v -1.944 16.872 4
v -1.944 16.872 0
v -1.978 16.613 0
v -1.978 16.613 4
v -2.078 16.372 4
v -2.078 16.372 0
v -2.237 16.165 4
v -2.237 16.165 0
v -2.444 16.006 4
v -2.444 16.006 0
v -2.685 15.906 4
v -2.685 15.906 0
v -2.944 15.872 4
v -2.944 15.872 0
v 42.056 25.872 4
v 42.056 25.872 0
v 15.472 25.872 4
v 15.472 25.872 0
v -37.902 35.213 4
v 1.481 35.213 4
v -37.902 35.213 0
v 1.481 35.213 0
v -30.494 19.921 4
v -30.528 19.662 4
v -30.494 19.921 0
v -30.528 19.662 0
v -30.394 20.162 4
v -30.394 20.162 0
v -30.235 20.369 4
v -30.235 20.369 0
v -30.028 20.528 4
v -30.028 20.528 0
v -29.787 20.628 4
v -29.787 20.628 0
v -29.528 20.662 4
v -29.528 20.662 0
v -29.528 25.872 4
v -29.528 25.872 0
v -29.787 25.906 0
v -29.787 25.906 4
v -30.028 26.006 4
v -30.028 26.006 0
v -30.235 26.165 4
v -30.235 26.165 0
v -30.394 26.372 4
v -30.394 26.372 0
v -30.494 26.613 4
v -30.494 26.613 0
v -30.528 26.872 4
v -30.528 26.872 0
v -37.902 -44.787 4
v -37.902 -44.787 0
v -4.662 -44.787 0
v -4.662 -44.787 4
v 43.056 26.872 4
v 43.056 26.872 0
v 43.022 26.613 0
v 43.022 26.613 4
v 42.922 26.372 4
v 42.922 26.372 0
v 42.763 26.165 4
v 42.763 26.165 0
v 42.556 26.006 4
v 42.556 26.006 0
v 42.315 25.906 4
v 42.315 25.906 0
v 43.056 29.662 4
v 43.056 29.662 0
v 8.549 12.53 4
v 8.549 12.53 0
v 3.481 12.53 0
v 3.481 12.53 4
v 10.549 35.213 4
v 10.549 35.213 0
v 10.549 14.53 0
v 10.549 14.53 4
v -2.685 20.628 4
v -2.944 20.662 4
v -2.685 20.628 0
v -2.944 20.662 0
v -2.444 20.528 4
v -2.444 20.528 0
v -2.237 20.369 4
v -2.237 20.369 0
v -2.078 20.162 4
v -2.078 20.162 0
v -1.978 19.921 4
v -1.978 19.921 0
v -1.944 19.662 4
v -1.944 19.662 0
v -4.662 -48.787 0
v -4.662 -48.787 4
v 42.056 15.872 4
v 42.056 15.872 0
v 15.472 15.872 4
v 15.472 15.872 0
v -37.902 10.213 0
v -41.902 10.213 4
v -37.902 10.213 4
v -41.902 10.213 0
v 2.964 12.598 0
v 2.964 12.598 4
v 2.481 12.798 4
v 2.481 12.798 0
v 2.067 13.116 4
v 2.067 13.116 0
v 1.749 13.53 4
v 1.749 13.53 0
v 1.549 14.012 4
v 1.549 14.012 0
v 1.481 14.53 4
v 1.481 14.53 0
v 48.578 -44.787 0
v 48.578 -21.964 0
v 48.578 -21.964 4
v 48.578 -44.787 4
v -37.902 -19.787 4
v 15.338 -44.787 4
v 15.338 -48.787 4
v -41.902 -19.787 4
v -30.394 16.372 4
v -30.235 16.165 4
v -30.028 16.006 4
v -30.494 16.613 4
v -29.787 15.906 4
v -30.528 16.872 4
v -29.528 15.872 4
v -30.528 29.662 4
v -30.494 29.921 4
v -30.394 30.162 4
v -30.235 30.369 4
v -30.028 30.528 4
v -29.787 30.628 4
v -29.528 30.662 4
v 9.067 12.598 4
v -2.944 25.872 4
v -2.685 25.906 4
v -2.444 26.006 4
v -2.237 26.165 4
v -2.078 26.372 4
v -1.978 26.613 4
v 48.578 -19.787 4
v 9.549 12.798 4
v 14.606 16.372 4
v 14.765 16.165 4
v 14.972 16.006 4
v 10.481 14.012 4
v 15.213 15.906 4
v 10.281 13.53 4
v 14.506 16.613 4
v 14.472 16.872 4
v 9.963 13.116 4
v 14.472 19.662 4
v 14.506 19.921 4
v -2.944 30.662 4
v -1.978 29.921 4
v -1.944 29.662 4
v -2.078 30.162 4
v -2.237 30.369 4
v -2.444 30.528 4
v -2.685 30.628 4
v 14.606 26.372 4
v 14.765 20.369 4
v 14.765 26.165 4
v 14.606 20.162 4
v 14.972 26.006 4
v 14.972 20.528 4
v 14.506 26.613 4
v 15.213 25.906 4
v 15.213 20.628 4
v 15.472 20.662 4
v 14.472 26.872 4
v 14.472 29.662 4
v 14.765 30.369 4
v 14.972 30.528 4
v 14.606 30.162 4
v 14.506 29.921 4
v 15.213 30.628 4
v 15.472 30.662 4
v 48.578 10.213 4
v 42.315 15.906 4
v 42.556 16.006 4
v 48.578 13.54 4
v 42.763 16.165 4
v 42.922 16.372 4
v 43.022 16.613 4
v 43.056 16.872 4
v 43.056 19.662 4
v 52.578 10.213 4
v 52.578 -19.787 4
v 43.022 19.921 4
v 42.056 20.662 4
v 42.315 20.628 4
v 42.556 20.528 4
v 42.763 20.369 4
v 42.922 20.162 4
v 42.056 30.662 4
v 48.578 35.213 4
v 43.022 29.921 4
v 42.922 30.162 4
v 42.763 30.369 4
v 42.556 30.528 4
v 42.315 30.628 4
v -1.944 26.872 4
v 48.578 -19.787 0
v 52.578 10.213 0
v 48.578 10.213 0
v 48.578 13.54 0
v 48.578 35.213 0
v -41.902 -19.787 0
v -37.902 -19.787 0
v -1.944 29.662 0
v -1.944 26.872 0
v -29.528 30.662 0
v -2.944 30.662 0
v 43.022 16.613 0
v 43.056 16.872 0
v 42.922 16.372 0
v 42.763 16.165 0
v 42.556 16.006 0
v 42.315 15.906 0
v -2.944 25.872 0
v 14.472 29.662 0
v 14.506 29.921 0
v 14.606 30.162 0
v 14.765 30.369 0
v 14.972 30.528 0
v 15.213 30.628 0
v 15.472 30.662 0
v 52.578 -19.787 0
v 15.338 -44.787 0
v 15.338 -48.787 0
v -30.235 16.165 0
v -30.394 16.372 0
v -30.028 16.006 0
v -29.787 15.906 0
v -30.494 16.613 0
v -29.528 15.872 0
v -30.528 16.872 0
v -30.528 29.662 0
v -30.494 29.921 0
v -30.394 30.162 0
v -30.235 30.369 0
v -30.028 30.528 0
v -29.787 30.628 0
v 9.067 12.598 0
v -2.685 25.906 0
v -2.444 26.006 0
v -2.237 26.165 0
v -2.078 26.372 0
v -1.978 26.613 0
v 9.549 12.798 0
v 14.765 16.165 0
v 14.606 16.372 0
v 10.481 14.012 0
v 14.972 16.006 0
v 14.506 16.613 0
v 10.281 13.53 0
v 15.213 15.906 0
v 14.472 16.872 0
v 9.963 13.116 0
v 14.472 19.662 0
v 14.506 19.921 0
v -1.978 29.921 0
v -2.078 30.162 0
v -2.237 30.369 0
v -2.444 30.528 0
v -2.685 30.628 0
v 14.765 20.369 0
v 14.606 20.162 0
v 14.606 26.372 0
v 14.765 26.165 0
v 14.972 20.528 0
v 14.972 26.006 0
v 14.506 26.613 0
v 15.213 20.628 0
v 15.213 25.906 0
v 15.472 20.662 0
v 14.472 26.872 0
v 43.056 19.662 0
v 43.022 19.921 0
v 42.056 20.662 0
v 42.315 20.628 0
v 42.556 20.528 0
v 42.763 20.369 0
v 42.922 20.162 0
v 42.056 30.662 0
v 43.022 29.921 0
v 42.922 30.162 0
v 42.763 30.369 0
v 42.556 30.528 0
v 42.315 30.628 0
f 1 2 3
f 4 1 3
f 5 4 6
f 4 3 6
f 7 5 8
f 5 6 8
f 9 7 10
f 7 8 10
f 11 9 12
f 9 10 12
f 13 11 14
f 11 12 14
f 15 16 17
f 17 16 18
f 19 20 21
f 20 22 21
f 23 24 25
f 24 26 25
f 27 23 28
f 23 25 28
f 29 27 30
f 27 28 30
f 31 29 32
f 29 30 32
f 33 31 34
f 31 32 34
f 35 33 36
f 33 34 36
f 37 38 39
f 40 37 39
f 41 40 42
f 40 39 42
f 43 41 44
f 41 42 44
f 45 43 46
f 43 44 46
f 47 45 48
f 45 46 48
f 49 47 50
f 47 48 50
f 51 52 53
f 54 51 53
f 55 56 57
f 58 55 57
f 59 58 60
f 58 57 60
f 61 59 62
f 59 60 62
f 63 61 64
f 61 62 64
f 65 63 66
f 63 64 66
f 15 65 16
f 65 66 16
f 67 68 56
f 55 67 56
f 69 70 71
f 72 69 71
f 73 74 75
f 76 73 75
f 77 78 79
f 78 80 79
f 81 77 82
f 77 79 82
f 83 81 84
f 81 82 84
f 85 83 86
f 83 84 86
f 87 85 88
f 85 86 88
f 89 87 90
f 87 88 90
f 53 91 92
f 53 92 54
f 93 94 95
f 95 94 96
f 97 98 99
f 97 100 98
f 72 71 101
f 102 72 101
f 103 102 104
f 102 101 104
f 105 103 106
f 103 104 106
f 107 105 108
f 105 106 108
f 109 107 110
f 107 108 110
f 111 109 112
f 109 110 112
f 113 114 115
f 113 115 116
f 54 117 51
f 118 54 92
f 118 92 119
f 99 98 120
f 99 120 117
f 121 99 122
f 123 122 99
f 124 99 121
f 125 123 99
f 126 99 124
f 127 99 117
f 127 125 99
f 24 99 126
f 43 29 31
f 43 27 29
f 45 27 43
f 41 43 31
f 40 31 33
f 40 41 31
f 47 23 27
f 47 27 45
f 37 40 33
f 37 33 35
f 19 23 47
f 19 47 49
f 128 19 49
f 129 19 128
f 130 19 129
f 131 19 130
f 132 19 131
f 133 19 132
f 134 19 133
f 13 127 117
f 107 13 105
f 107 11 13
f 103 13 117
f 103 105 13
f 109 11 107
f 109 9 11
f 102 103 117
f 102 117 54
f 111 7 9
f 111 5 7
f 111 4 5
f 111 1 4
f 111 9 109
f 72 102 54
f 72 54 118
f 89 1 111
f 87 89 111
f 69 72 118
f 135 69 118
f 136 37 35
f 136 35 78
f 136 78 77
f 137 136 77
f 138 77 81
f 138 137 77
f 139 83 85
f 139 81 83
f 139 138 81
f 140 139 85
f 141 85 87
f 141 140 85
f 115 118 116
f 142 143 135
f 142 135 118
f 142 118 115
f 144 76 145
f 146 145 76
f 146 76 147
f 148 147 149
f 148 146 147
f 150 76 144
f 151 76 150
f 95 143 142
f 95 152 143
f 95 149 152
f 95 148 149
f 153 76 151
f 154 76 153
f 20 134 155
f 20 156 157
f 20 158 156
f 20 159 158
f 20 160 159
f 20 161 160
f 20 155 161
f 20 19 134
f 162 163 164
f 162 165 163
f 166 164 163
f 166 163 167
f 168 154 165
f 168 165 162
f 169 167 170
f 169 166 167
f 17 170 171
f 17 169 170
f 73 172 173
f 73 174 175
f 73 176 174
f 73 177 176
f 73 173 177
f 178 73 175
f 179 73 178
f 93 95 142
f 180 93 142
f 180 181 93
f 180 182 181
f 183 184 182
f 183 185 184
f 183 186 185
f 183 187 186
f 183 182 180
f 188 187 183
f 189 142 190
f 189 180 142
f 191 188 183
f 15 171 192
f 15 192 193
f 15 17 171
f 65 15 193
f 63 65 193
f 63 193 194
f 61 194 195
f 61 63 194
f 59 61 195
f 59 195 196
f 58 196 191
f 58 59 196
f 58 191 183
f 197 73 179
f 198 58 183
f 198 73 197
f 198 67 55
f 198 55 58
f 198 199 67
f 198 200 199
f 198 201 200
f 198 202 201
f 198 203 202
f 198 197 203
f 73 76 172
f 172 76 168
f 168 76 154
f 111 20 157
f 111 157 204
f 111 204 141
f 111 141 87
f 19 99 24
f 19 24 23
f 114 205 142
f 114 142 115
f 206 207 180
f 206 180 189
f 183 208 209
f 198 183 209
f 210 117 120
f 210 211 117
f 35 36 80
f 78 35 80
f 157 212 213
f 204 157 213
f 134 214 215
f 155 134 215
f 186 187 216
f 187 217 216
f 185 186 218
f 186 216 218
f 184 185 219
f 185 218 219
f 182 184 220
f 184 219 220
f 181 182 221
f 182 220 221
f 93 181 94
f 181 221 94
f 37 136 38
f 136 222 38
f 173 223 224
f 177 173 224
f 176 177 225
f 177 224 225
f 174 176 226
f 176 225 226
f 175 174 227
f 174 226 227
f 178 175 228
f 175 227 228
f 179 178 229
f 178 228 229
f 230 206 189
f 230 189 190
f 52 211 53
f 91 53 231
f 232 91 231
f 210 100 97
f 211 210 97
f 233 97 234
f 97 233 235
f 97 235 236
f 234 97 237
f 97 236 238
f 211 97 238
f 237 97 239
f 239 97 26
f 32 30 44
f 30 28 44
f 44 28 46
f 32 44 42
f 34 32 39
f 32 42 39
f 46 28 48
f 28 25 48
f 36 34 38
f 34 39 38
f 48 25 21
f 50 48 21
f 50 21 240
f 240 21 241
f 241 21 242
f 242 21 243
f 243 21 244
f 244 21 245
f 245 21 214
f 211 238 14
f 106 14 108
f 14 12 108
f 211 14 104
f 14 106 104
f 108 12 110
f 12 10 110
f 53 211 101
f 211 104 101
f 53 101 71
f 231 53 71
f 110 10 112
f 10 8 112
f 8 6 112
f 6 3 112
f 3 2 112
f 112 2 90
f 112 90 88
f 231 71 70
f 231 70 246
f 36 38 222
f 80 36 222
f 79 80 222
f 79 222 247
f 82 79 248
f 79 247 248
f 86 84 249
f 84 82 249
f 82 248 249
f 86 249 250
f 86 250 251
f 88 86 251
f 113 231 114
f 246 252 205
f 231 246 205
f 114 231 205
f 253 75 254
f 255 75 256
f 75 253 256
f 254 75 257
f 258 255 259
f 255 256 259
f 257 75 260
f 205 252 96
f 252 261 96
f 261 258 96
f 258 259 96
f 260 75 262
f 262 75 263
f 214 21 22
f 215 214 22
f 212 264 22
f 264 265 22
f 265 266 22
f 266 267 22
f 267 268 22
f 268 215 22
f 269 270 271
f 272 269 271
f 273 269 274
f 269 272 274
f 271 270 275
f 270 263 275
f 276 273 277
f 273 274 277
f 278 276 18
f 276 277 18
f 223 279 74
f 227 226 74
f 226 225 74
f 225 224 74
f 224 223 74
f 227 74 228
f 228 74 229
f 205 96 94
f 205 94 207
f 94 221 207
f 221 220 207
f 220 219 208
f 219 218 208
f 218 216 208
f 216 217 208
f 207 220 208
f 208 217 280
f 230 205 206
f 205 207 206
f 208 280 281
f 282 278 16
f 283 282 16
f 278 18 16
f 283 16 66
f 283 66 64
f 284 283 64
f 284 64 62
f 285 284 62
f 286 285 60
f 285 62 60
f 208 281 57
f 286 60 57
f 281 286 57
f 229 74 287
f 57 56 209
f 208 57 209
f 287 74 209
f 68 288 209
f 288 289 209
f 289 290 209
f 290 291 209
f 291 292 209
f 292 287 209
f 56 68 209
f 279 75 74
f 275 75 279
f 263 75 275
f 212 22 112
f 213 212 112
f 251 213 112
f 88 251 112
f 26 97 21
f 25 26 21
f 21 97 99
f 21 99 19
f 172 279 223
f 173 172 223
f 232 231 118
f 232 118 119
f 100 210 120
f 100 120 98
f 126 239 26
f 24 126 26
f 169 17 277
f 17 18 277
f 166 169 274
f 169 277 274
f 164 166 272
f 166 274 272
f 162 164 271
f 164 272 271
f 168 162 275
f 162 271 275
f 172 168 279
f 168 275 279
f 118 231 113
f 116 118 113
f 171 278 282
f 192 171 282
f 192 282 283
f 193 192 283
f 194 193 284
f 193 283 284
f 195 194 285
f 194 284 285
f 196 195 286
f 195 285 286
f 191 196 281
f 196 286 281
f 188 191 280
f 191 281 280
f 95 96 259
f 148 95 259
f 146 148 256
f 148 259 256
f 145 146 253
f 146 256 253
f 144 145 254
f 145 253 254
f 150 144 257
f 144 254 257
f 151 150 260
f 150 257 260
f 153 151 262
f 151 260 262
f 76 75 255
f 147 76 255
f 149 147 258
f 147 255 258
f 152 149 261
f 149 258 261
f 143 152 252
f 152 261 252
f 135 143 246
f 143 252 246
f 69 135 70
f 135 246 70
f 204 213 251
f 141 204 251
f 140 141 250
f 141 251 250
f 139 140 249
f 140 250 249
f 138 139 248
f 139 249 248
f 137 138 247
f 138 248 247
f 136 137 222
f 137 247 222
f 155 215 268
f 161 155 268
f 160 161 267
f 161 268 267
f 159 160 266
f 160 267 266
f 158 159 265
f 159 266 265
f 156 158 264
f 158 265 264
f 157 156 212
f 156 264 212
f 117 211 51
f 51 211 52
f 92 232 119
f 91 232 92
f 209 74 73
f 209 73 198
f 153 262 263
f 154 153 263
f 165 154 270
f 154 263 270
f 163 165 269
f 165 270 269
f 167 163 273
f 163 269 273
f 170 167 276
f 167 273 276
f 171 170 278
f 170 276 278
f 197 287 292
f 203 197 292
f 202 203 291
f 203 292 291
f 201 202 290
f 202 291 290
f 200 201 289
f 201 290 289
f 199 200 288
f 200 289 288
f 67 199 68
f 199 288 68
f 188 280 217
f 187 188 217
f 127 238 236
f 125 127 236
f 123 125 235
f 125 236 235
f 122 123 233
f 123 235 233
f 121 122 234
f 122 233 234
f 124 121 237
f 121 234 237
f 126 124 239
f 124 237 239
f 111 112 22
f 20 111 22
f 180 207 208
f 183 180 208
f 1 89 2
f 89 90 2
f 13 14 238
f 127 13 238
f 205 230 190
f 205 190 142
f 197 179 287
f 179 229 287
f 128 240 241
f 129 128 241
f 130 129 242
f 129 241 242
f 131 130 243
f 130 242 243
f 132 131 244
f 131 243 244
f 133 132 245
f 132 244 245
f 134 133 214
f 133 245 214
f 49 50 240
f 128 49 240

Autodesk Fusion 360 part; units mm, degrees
sketch "Sketch1" plane through (0, 0, 0) normal (0, 0, 1) x (1, 0, 0)
  line L0 (15.3385, -44.7871) -> (15.3385, -48.7871)
  line L1 (15.3385, -48.7871) -> (-4.6615, -48.7871)
  line L2 (-4.6615, -48.7871) -> (-4.6615, -44.7871)
  line L3 (-37.9015, -44.7871) -> (-4.6615, -44.7871)
  line L4 (15.3385, -44.7871) -> (48.5785, -44.7871)
  line L5 (-37.9015, -19.7871) -> (-41.9015, -19.7871)
  line L6 (-41.9015, -19.7871) -> (-41.9015, 10.2129)
  line L7 (-41.9015, 10.2129) -> (-37.9015, 10.2129)
  line L8 (-37.9015, -19.7871) -> (-37.9015, -44.7871)
  line L9 (-37.9015, 10.2129) -> (-37.9015, 35.2129)
  line L10 (48.5785, 10.2129) -> (52.5785, 10.2129)
  line L11 (52.5785, 10.2129) -> (52.5785, -19.7871)
  line L12 (52.5785, -19.7871) -> (48.5785, -19.7871)
  line L13 (48.5785, -19.7871) -> (48.5785, -21.9637)
  line L14 (48.5785, -21.9637) -> (48.5785, -44.7871)
  line L15 (48.5785, 10.2129) -> (48.5785, 13.5404)
  line L16 (48.5785, 13.5404) -> (48.5785, 35.2129)
  line L17 (-29.5277, 30.6619) -> (-2.944, 30.6619)
  line L18 (-1.944, 29.6619) -> (-1.944, 26.8722)
  line L19 (-2.944, 25.8722) -> (-29.5277, 25.8722)
  line L20 (-30.5277, 26.8722) -> (-30.5277, 29.6619)
  arc A0 (-30.5277, 26.8722) -> (-29.5277, 25.8722) centre (-29.5277, 26.8722) ccw
  arc A1 (-29.5277, 30.6619) -> (-30.5277, 29.6619) centre (-29.5277, 29.6619) ccw
  arc A2 (-1.944, 29.6619) -> (-2.944, 30.6619) centre (-2.944, 29.6619) ccw
  arc A3 (-2.944, 25.8722) -> (-1.944, 26.8722) centre (-2.944, 26.8722) ccw
  line L21 (-30.5277, 16.8722) -> (-30.5277, 19.6619)
  line L22 (-29.5277, 20.6619) -> (-2.944, 20.6619)
  arc A4 (-1.944, 19.6619) -> (-2.944, 20.6619) centre (-2.944, 19.6619) ccw
  line L23 (-1.944, 19.6619) -> (-1.944, 16.8722)
  arc A5 (-29.5277, 20.6619) -> (-30.5277, 19.6619) centre (-29.5277, 19.6619) ccw
  arc A6 (-2.944, 15.8722) -> (-1.944, 16.8722) centre (-2.944, 16.8722) ccw
  arc A7 (-30.5277, 16.8722) -> (-29.5277, 15.8722) centre (-29.5277, 16.8722) ccw
  line L24 (-2.944, 15.8722) -> (-29.5277, 15.8722)
  arc A8 (42.056, 25.8722) -> (43.056, 26.8722) centre (42.056, 26.8722) ccw
  line L25 (42.056, 25.8722) -> (15.4723, 25.8722)
  line L26 (14.4723, 26.8722) -> (14.4723, 29.6619)
  arc A9 (14.4723, 16.8722) -> (15.4723, 15.8722) centre (15.4723, 16.8722) ccw
  arc A10 (15.4723, 20.6619) -> (14.4723, 19.6619) centre (15.4723, 19.6619) ccw
  arc A11 (42.056, 15.8722) -> (43.056, 16.8722) centre (42.056, 16.8722) ccw
  arc A12 (43.056, 19.6619) -> (42.056, 20.6619) centre (42.056, 19.6619) ccw
  arc A13 (15.4723, 30.6619) -> (14.4723, 29.6619) centre (15.4723, 29.6619) ccw
  line L27 (42.056, 15.8722) -> (15.4723, 15.8722)
  line L28 (43.056, 29.6619) -> (43.056, 26.8722)
  arc A14 (14.4723, 26.8722) -> (15.4723, 25.8722) centre (15.4723, 26.8722) ccw
  line L29 (43.056, 19.6619) -> (43.056, 16.8722)
  line L30 (15.4723, 30.6619) -> (42.056, 30.6619)
  line L31 (14.4723, 16.8722) -> (14.4723, 19.6619)
  line L32 (15.4723, 20.6619) -> (42.056, 20.6619)
  arc A15 (43.056, 29.6619) -> (42.056, 30.6619) centre (42.056, 29.6619) ccw
  line L33 (10.5491, 35.2129) -> (10.5491, 14.5299)
  line L34 (8.5491, 12.5299) -> (3.4812, 12.5299)
  line L35 (1.4812, 14.5299) -> (1.4812, 35.2129)
  arc A16 (1.4812, 14.5299) -> (3.4812, 12.5299) centre (3.4812, 14.5299) ccw
  arc A17 (8.5491, 12.5299) -> (10.5491, 14.5299) centre (8.5491, 14.5299) ccw
  line L36 (10.5491, 35.2129) -> (48.5785, 35.2129)
  line L37 (1.4812, 35.2129) -> (-37.9015, 35.2129)
extrude "Extrude1" add sketch "Sketch1" along normal blind 4
